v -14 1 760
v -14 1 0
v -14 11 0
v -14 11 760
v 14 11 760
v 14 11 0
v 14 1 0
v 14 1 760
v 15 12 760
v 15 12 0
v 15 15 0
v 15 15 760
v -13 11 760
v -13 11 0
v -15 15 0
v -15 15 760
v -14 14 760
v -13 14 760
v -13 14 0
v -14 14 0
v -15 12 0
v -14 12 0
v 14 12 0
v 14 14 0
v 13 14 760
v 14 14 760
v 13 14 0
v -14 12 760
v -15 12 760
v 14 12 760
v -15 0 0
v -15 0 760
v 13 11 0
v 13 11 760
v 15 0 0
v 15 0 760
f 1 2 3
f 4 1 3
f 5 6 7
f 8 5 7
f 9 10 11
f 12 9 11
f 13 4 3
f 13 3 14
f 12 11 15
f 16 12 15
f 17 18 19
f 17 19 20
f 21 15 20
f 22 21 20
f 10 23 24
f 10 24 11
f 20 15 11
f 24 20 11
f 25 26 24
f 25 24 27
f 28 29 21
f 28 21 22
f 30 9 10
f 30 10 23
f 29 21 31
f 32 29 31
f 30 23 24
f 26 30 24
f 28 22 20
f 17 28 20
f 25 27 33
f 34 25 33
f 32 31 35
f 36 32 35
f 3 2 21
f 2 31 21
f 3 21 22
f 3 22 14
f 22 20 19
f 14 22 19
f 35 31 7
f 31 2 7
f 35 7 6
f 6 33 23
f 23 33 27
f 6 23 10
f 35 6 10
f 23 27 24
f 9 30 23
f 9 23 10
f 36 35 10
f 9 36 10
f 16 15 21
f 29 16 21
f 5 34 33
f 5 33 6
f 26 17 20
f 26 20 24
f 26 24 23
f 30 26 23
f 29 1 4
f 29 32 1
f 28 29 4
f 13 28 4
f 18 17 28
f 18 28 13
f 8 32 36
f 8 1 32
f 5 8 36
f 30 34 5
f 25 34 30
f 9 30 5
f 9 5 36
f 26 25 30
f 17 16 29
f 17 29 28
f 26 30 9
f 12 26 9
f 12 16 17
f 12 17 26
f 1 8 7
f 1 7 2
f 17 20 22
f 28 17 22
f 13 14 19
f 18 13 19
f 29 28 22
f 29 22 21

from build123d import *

# Parameters (mm, degrees)
F1_DEPTH = 760
F2_DEPTH = 760


with BuildPart() as f1:
    # F0 (on Top) → F1 (new body)
    with BuildSketch(Plane.XY):
        Polygon((-14, 12), (-15, 12), (-15, 0), (15, 0), (15, 12), (14, 12), (14, 14), (13, 14), (13, 11), (14, 11), (14, 1), (-14, 1), (-14, 11), (-13, 11), (-13, 14), (-14, 14), align=None)
    extrude(amount=F1_DEPTH)


with BuildPart() as f2:
    # F0 (on Top) → F2 (new body)
    with BuildSketch(Plane.XY):
        Polygon((15, 15), (-15, 15), (-15, 12), (-14, 12), (-14, 14), (-13, 14), (13, 14), (14, 14), (14, 12), (15, 12), align=None)
    extrude(amount=F2_DEPTH)


solid = Compound([f1.part, f2.part])
